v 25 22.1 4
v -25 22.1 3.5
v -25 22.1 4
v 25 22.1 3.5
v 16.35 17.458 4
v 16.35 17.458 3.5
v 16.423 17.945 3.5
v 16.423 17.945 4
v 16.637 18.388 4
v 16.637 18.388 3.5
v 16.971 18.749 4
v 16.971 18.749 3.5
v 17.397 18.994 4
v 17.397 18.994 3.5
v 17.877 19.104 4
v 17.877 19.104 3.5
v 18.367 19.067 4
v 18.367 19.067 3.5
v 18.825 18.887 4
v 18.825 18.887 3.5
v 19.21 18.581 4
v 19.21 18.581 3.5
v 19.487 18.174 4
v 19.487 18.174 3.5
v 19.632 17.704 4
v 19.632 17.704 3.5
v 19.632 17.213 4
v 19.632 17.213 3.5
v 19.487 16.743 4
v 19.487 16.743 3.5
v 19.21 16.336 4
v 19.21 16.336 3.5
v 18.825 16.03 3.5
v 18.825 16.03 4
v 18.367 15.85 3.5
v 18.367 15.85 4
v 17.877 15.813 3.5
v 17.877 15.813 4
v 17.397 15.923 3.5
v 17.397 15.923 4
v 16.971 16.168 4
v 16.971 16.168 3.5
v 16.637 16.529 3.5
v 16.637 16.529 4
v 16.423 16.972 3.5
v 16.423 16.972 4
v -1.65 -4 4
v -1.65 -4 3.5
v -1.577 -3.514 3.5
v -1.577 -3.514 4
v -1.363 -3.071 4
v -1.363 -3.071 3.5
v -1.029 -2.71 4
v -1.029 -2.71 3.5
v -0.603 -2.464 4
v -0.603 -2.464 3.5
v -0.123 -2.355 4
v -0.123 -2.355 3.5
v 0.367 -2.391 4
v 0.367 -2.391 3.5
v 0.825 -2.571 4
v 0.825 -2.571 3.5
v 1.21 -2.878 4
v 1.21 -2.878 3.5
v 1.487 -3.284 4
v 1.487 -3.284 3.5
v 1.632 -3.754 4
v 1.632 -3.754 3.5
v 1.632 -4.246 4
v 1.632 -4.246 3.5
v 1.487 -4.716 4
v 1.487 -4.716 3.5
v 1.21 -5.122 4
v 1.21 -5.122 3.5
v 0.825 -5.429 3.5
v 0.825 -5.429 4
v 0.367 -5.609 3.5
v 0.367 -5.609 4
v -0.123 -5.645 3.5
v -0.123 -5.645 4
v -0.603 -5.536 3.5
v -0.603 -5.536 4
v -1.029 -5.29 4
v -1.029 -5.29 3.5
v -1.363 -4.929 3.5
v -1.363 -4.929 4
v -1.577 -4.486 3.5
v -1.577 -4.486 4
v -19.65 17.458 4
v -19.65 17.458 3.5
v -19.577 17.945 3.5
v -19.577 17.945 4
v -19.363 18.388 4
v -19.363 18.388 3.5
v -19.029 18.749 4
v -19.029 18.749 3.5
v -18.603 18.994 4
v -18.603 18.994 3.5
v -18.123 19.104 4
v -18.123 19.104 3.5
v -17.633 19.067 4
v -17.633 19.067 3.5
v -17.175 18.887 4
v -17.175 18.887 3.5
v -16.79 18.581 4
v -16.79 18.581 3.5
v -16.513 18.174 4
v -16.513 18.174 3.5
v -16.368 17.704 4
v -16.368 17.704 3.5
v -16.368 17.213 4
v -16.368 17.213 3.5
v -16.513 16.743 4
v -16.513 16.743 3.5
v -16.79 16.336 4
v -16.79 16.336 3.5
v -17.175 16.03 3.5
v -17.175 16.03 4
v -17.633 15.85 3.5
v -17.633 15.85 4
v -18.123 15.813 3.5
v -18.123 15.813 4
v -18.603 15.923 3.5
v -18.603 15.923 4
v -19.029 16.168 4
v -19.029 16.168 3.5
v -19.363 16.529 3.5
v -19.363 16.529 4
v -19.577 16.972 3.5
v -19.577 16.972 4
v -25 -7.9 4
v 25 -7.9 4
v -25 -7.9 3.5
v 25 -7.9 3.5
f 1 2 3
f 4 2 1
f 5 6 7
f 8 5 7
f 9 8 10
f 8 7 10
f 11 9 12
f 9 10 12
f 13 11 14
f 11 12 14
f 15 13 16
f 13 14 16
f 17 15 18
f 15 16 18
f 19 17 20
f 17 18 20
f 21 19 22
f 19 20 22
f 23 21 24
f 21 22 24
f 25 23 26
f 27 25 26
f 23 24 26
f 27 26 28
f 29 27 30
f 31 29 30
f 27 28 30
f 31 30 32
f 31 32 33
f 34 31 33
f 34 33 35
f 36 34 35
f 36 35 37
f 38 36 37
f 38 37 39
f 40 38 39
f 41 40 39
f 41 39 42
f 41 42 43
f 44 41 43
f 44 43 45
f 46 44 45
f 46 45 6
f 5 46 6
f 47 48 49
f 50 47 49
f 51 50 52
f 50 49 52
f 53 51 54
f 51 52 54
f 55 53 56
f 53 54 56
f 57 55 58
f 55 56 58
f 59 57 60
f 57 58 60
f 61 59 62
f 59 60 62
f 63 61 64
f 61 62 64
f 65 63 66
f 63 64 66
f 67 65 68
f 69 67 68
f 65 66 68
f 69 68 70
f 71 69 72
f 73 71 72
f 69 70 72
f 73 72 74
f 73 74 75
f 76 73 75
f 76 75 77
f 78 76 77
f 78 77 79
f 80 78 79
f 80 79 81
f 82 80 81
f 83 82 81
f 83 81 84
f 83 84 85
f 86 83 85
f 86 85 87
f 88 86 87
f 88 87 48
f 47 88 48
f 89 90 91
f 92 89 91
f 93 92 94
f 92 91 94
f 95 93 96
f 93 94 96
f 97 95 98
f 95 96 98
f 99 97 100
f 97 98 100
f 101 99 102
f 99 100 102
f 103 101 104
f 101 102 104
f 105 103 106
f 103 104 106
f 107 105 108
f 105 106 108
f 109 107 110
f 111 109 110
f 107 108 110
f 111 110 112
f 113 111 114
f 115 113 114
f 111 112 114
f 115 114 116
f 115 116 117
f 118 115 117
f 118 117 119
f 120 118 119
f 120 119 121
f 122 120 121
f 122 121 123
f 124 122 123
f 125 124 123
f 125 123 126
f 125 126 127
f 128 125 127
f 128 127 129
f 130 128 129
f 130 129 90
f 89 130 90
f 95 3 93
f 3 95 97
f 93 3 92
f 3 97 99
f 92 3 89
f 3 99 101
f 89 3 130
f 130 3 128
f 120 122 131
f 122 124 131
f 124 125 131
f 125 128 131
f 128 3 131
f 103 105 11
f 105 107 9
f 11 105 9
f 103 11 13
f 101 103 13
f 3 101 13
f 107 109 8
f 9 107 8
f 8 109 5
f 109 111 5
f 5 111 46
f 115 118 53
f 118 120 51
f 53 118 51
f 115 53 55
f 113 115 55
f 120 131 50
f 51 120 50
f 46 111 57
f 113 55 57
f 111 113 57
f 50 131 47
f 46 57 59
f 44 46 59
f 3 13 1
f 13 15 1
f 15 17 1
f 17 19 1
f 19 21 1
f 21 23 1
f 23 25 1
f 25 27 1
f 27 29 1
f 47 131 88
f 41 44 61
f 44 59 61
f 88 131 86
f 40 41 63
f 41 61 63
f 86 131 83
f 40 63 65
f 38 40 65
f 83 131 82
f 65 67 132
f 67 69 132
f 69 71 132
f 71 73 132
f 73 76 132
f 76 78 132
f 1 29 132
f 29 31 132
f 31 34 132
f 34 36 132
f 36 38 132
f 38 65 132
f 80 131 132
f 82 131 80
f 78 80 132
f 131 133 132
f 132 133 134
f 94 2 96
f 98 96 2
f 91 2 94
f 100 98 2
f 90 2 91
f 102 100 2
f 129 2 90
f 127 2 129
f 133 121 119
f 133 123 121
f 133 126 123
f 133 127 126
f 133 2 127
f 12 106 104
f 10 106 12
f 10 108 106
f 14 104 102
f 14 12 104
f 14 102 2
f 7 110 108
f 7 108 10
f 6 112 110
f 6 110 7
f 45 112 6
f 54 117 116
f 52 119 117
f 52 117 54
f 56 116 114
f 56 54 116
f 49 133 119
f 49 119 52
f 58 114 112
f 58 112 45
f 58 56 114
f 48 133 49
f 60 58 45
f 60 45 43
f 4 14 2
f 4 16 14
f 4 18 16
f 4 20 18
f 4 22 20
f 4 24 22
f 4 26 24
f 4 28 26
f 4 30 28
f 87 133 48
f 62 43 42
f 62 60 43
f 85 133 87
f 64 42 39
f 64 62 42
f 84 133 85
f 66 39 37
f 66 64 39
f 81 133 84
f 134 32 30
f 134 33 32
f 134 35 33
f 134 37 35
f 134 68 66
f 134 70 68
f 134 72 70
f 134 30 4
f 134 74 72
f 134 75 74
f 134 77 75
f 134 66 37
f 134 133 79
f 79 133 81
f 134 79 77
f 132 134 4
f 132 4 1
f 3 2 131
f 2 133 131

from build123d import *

# Parameters (mm, degrees)
F0_W            = 50
F0_H            = 8
F1_DEPTH        = 4
F3_DEPTH        = 5
F4_DEPTH        = 5
F5_D            = 3.3
F5_CBORE_D      = 6.5
F5_CBORE_DEPTH  = 0
F6_DEPTH        = 1.1
F7_DEPTH        = 4.4
F8_DEPTH        = 3.5
F9_DEPTH        = 8.7
F11_D           = 3.3
F11_CBORE_D     = 6.5
F11_CBORE_DEPTH = 0


with BuildPart() as f1:
    # F0 (on Top) → F1 (new body)
    with BuildSketch(Plane.XY):
        Rectangle(F0_W, F0_H)
    extrude(amount=F1_DEPTH)

    # F3 (add): a face of the model
    f3_faces = [f1.faces().sort_by_distance(p)[0] for p in [
        (0, -4, 2),
    ]]
    extrude(f3_faces, amount=F3_DEPTH)

    # F4 (add): a face of the model
    f4_faces = [f1.faces().sort_by_distance(p)[0] for p in [
        (0, 4, 2),
    ]]
    extrude(f4_faces, amount=F4_DEPTH)

    # F5 (through all)
    with Locations(Plane.XY.offset(4)):
        with Locations((0, -4)):
            CounterBoreHole(F5_D / 2, F5_CBORE_D / 2, F5_CBORE_DEPTH)

    # F6 (cut): a face of the model
    f6_faces = [f1.faces().sort_by_distance(p)[0] for p in [
        (0, -9, 2),
    ]]
    extrude(f6_faces, amount=-F6_DEPTH, mode=Mode.SUBTRACT)

    # F7 (add): a face of the model
    f7_faces = [f1.faces().sort_by_distance(p)[0] for p in [
        (0, 9, 2),
    ]]
    extrude(f7_faces, amount=F7_DEPTH)

    # F8 (cut): a face of the model
    f8_faces = [f1.faces().sort_by_distance(p)[0] for p in [
        (0, 2.8046479423, 0),
    ]]
    extrude(f8_faces, amount=-F8_DEPTH, mode=Mode.SUBTRACT)

    # F9 (add): a face of the model
    f9_faces = [f1.faces().sort_by_distance(p)[0] for p in [
        (0, 13.4, 3.75),
    ]]
    extrude(f9_faces, amount=F9_DEPTH)

    # F11 (through all)
    with Locations(Plane.XY.offset(4)):
        with Locations((-18, 17.4584981568), (18, 17.4584981568)):
            CounterBoreHole(F11_D / 2, F11_CBORE_D / 2, F11_CBORE_DEPTH)


solid = f1.part
